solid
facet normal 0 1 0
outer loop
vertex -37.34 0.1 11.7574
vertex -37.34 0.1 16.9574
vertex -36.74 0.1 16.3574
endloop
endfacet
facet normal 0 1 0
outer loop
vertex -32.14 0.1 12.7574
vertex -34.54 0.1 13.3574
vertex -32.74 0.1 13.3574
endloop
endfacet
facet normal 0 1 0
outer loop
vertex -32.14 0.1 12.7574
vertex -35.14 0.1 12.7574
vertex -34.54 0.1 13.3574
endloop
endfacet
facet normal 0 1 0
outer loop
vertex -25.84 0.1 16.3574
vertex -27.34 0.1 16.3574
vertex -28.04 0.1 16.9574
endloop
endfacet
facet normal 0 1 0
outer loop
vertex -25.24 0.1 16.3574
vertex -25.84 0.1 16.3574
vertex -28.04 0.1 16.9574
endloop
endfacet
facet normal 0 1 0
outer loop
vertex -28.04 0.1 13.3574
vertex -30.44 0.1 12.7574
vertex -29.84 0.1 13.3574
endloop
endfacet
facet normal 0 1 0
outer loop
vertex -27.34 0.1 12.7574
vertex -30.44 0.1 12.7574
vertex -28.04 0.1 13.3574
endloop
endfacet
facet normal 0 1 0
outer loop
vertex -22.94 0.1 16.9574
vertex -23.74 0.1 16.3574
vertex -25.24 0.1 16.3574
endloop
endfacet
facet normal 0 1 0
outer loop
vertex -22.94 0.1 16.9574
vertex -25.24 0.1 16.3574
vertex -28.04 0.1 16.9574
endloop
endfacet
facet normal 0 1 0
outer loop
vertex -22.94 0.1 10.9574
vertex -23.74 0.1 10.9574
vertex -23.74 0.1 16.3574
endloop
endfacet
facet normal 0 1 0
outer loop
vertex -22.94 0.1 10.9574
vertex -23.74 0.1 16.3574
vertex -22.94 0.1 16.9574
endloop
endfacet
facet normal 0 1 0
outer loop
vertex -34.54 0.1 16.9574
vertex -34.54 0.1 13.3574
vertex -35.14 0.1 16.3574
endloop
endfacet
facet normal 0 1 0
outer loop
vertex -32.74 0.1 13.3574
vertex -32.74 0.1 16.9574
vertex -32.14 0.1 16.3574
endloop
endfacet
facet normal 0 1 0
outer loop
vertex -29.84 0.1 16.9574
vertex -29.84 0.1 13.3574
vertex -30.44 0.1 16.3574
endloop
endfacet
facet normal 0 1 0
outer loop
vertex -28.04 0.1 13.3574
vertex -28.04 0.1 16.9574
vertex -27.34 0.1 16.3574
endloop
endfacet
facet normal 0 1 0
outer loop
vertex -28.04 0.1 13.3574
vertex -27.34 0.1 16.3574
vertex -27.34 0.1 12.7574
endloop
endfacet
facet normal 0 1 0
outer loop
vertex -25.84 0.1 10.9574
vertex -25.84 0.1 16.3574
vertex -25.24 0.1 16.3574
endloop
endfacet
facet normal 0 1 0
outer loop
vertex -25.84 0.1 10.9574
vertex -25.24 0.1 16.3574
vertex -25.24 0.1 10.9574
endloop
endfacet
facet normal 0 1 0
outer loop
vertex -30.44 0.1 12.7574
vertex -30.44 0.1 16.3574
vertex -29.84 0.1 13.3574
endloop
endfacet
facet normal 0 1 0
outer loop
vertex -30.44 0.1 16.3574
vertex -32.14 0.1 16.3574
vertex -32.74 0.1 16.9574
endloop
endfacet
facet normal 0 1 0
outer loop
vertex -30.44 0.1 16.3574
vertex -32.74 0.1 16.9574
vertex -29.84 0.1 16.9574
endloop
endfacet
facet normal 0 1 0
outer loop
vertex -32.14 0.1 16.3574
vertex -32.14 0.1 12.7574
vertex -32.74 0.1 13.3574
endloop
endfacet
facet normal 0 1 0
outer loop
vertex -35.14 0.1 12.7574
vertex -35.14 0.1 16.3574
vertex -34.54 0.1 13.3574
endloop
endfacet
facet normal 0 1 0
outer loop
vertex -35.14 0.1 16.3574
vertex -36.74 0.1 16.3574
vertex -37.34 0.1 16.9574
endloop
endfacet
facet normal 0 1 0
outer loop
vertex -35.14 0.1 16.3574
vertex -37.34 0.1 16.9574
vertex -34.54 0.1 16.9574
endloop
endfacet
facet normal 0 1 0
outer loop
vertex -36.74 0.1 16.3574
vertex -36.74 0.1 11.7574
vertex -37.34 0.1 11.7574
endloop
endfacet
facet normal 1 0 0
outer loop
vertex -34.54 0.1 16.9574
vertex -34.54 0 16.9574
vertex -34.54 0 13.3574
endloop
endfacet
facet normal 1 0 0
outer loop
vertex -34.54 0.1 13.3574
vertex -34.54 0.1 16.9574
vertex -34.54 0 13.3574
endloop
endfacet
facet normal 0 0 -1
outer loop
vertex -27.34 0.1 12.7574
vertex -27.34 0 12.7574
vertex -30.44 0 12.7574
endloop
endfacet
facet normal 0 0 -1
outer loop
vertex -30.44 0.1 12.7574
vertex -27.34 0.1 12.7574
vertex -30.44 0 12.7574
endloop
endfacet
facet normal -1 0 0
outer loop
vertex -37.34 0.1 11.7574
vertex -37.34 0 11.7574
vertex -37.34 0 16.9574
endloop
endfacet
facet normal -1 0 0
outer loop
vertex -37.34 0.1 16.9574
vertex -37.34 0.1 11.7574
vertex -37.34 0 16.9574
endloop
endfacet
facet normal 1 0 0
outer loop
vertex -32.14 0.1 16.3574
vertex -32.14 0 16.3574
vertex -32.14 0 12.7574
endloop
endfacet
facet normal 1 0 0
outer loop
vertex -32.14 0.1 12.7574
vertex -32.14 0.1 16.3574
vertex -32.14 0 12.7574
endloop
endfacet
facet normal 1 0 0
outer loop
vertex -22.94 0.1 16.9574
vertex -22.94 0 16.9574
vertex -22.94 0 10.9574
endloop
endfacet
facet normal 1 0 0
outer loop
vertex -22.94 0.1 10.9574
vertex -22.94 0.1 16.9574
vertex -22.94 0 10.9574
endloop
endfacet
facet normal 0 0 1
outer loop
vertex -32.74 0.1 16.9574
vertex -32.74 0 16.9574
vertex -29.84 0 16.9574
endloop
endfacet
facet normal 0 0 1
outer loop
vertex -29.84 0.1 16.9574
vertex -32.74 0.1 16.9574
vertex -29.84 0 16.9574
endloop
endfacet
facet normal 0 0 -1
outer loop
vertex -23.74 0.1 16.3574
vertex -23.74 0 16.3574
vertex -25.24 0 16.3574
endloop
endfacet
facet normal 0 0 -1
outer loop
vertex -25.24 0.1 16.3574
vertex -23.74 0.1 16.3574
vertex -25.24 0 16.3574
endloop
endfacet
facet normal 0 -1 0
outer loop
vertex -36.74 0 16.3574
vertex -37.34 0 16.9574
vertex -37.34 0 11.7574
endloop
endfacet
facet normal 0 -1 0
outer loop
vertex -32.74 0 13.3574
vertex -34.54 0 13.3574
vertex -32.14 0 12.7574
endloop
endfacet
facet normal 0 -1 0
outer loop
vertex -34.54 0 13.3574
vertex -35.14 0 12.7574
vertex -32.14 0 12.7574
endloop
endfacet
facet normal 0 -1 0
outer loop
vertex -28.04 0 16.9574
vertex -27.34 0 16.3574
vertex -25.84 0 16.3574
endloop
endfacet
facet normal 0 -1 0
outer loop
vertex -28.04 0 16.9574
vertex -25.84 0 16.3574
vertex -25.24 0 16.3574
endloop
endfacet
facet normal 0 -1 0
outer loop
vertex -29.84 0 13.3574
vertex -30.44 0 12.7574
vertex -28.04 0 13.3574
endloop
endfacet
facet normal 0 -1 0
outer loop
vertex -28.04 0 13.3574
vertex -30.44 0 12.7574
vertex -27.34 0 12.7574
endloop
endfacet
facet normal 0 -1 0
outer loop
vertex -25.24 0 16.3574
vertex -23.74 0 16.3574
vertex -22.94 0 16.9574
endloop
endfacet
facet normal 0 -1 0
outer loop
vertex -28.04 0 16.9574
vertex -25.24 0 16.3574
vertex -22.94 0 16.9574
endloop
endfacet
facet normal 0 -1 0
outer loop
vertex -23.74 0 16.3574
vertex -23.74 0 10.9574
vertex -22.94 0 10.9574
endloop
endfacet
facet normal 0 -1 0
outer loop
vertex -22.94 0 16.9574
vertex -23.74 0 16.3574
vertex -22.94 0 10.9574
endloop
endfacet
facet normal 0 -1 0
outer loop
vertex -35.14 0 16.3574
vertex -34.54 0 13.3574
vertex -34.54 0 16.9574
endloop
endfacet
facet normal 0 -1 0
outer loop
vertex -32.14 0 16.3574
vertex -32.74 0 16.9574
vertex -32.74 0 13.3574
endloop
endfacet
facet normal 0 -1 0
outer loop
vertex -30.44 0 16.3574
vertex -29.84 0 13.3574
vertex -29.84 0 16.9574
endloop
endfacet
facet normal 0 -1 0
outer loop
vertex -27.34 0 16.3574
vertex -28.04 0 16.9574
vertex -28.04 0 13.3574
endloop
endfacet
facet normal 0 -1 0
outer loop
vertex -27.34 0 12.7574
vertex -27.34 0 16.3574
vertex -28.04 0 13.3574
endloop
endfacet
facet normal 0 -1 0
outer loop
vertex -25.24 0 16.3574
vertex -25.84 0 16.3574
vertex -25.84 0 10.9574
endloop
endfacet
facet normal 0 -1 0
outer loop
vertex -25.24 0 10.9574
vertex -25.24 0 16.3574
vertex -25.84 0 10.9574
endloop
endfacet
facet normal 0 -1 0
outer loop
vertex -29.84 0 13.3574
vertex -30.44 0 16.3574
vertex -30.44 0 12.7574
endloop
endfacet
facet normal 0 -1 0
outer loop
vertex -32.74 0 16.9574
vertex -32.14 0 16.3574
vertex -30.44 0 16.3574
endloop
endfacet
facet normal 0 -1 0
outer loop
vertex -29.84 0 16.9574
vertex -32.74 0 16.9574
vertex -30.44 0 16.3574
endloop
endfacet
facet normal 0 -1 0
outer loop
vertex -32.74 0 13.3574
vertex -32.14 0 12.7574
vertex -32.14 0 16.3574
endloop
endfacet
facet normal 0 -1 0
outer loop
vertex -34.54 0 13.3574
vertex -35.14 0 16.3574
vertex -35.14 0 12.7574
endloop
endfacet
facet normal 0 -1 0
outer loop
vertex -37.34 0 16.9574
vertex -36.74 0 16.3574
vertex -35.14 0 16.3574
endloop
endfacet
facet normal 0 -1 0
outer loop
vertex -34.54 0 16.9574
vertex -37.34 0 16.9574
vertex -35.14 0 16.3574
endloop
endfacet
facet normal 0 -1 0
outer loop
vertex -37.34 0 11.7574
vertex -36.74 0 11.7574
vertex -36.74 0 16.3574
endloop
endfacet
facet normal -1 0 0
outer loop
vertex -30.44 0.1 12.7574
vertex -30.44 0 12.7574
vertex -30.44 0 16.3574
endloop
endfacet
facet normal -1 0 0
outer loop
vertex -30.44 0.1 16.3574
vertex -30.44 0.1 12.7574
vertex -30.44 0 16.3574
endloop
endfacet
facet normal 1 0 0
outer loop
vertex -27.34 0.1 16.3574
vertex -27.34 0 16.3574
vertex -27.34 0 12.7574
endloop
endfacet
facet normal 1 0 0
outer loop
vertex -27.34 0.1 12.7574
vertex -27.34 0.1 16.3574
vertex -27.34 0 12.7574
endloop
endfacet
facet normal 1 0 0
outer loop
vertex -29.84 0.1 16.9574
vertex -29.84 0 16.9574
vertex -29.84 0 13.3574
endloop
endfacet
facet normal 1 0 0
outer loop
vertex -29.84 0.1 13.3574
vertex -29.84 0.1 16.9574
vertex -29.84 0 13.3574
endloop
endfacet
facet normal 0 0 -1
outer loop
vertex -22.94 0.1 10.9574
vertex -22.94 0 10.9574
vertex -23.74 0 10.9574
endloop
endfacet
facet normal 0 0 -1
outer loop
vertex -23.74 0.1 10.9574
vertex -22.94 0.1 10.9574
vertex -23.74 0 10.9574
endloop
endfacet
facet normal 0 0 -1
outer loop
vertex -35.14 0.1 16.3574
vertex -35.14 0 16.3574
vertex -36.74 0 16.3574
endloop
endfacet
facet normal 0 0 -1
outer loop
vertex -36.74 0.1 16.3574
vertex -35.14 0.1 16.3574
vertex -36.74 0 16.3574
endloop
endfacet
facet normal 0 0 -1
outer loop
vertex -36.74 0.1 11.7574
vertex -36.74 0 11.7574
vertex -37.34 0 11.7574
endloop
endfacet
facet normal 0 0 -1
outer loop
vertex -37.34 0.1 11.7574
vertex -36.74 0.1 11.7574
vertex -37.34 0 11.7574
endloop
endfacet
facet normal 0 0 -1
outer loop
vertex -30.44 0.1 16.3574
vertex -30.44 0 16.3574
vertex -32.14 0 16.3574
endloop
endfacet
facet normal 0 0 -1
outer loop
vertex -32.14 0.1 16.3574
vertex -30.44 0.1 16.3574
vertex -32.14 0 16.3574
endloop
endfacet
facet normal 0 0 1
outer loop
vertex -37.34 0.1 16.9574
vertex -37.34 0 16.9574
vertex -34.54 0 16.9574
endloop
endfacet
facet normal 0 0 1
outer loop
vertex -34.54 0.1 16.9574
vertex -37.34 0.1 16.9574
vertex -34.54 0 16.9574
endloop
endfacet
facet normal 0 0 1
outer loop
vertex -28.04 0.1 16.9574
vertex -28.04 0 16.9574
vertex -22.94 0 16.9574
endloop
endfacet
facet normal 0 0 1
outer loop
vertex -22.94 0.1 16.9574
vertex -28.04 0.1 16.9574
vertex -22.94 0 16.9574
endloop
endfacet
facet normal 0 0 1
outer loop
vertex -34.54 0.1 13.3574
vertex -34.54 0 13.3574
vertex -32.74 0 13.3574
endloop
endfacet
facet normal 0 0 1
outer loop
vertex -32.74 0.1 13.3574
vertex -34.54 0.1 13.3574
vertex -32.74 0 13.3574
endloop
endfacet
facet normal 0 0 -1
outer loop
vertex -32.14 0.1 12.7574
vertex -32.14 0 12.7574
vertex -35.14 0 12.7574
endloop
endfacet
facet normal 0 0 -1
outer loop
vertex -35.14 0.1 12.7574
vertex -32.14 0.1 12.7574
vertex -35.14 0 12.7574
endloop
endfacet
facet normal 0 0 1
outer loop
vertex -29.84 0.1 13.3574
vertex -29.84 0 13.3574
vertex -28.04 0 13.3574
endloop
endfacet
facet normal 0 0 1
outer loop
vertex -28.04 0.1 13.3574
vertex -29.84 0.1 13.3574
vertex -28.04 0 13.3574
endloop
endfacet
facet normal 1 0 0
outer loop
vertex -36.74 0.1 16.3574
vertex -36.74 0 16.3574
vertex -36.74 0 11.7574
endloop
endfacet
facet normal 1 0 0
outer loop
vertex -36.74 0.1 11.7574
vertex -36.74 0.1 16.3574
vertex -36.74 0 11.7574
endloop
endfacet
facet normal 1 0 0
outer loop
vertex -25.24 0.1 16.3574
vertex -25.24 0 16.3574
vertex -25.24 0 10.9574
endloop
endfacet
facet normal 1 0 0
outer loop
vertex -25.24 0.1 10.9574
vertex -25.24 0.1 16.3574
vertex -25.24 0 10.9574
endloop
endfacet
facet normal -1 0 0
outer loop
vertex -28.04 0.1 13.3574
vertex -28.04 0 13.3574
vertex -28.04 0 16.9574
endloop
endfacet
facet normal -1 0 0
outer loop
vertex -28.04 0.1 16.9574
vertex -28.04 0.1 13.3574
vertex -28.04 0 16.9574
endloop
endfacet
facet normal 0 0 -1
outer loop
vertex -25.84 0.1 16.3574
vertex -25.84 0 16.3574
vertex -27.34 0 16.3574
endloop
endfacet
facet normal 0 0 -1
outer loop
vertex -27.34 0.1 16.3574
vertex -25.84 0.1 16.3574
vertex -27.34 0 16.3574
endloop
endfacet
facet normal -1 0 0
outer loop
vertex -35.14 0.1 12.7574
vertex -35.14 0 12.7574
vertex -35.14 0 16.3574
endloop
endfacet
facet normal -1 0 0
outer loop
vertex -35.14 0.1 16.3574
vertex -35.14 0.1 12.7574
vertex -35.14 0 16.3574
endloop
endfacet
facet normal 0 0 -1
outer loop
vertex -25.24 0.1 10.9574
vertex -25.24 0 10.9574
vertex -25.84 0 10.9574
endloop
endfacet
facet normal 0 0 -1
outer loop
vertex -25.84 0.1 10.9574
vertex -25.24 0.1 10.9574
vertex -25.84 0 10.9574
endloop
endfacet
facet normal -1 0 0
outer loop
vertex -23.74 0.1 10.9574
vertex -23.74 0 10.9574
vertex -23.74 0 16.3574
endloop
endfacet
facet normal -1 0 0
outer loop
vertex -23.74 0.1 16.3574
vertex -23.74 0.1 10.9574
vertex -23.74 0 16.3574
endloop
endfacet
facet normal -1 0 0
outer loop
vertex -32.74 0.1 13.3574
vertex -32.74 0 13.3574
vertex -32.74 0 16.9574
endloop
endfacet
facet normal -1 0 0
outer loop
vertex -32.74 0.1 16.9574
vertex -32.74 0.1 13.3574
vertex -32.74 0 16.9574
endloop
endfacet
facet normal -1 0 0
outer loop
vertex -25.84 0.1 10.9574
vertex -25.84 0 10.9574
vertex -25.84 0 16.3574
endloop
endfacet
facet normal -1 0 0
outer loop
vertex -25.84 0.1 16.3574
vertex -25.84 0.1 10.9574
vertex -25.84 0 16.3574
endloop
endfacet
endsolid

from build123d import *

# Parameters (mm, degrees)
SKETCH1_R           = 1.5875
BOSS_EXTRUDE1_DEPTH = 1.65
SKETCH2_R           = 0.4
CUT_EXTRUDE1_DEPTH  = 1.65
SKETCH3_R           = 0.4
CUT_EXTRUDE2_DEPTH  = 1.65
LPATTERN1_COUNT     = 15
LPATTERN1_PITCH     = 2.54
SKETCH4_R           = 0.4
CUT_EXTRUDE3_DEPTH  = 1.65
LPATTERN2_COUNT     = 10
LPATTERN2_PITCH     = 2.54
EXTRUDE_1_DEPTH     = 0.1
SKETCH_2_W          = 71.696119323
SKETCH_2_H          = 83.90888514
CUT_EXTRUDE_1_DEPTH = 87.897033896


with BuildPart() as part:
    # Sketch1 → Boss-Extrude1 (new body)
    with BuildSketch(Plane(origin=(0, 0, 0), x_dir=(1, 0, 0), z_dir=(0, 1, 0))):
        Polygon((0, 0), (-53.34, 0), (-53.34, 66.04), (-40.386, 66.04), (-37.846, 68.58), (-5.08, 68.58), (-2.54, 66.04), (0, 66.04), align=None)
        with Locations(Location((-7.62, 66.04, 0), (0, 0, 270))):
            Circle(SKETCH1_R, mode=Mode.SUBTRACT)
        with Locations(Location((-35.56, 66.04, 0), (0, 0, 270))):
            Circle(SKETCH1_R, mode=Mode.SUBTRACT)
        with Locations(Location((-2.54, 13.97, 0), (0, 0, 270))):
            Circle(SKETCH1_R, mode=Mode.SUBTRACT)
        with Locations(Location((-50.8, 15.24, 0), (0, 0, 270))):
            Circle(SKETCH1_R, mode=Mode.SUBTRACT)
    extrude(amount=-BOSS_EXTRUDE1_DEPTH)

    # Sketch2 → Cut-Extrude1 (cut)
    with BuildSketch(Plane(origin=(0, 0, 0), x_dir=(1, 0, 0), z_dir=(0, 1, 0))):
        with Locations(Location((-2.54, 27.94, 0), (0, 0, 270))):
            Circle(SKETCH2_R)
    cut_extrude1 = extrude(amount=-CUT_EXTRUDE1_DEPTH, mode=Mode.SUBTRACT)

    # Sketch3 → Cut-Extrude2 (cut)
    with BuildSketch(Plane(origin=(0, 0, 0), x_dir=(1, 0, 0), z_dir=(0, 1, 0))):
        with Locations(Location((-50.8, 18.796, 0), (0, 0, 270))):
            Circle(SKETCH3_R)
    cut_extrude2 = extrude(amount=-CUT_EXTRUDE2_DEPTH, mode=Mode.SUBTRACT)

    # LPattern1: Cut-Extrude1 ×15, 1 skipped
    with Locations(*[(0, 0, -i * LPATTERN1_PITCH) for i in range(1, LPATTERN1_COUNT) if i not in (8,)]):
        add(cut_extrude1, mode=Mode.SUBTRACT)

    # Sketch4 → Cut-Extrude3 (cut)
    with BuildSketch(Plane(origin=(0, 0, 0), x_dir=(1, 0, 0), z_dir=(0, 1, 0))):
        with Locations(Location((-50.8, 45.72, 0), (0, 0, 270))):
            Circle(SKETCH4_R)
    extrude(amount=-CUT_EXTRUDE3_DEPTH, mode=Mode.SUBTRACT)

    # LPattern2: Cut-Extrude2 ×10
    with Locations(*[(0, 0, -i * LPATTERN2_PITCH) for i in range(1, LPATTERN2_COUNT)]):
        add(cut_extrude2, mode=Mode.SUBTRACT)

    # 草图2 → 切除-拉伸1 (cut, through all)
    with BuildSketch(Plane(origin=(0, 0, 0), x_dir=(1, 0, 0), z_dir=(0, 1, 0))):
        with Locations((-23.858381216, 34.717351285)):
            Rectangle(SKETCH_2_W, SKETCH_2_H)
    extrude(amount=-CUT_EXTRUDE_1_DEPTH, mode=Mode.SUBTRACT)


with BuildPart() as body_2:
    # 草图1 → 凸台-拉伸1 (new body)
    with BuildSketch(Plane(origin=(0, 0, 0), x_dir=(1, 0, 0), z_dir=(0, 1, 0))):
        Polygon((-37.34, -11.757389562), (-37.34, -16.957389562), (-34.54, -16.957389562), (-34.54, -13.357389562), (-32.74, -13.357389562), (-32.74, -16.957389562), (-29.84, -16.957389562), (-29.84, -13.357389562), (-28.04, -13.357389562), (-28.04, -16.957389562), (-22.94, -16.957389562), (-22.94, -10.957389562), (-23.74, -10.957389562), (-23.74, -16.357389562), (-25.24, -16.357389562), (-25.24, -10.957389562), (-25.84, -10.957389562), (-25.84, -16.357389562), (-27.34, -16.357389562), (-27.34, -12.757389562), (-30.44, -12.757389562), (-30.44, -16.357389562), (-32.14, -16.357389562), (-32.14, -12.757389562), (-35.14, -12.757389562), (-35.14, -16.357389562), (-36.74, -16.357389562), (-36.74, -11.757389562), align=None)
    extrude(amount=EXTRUDE_1_DEPTH)


solid = body_2.part
